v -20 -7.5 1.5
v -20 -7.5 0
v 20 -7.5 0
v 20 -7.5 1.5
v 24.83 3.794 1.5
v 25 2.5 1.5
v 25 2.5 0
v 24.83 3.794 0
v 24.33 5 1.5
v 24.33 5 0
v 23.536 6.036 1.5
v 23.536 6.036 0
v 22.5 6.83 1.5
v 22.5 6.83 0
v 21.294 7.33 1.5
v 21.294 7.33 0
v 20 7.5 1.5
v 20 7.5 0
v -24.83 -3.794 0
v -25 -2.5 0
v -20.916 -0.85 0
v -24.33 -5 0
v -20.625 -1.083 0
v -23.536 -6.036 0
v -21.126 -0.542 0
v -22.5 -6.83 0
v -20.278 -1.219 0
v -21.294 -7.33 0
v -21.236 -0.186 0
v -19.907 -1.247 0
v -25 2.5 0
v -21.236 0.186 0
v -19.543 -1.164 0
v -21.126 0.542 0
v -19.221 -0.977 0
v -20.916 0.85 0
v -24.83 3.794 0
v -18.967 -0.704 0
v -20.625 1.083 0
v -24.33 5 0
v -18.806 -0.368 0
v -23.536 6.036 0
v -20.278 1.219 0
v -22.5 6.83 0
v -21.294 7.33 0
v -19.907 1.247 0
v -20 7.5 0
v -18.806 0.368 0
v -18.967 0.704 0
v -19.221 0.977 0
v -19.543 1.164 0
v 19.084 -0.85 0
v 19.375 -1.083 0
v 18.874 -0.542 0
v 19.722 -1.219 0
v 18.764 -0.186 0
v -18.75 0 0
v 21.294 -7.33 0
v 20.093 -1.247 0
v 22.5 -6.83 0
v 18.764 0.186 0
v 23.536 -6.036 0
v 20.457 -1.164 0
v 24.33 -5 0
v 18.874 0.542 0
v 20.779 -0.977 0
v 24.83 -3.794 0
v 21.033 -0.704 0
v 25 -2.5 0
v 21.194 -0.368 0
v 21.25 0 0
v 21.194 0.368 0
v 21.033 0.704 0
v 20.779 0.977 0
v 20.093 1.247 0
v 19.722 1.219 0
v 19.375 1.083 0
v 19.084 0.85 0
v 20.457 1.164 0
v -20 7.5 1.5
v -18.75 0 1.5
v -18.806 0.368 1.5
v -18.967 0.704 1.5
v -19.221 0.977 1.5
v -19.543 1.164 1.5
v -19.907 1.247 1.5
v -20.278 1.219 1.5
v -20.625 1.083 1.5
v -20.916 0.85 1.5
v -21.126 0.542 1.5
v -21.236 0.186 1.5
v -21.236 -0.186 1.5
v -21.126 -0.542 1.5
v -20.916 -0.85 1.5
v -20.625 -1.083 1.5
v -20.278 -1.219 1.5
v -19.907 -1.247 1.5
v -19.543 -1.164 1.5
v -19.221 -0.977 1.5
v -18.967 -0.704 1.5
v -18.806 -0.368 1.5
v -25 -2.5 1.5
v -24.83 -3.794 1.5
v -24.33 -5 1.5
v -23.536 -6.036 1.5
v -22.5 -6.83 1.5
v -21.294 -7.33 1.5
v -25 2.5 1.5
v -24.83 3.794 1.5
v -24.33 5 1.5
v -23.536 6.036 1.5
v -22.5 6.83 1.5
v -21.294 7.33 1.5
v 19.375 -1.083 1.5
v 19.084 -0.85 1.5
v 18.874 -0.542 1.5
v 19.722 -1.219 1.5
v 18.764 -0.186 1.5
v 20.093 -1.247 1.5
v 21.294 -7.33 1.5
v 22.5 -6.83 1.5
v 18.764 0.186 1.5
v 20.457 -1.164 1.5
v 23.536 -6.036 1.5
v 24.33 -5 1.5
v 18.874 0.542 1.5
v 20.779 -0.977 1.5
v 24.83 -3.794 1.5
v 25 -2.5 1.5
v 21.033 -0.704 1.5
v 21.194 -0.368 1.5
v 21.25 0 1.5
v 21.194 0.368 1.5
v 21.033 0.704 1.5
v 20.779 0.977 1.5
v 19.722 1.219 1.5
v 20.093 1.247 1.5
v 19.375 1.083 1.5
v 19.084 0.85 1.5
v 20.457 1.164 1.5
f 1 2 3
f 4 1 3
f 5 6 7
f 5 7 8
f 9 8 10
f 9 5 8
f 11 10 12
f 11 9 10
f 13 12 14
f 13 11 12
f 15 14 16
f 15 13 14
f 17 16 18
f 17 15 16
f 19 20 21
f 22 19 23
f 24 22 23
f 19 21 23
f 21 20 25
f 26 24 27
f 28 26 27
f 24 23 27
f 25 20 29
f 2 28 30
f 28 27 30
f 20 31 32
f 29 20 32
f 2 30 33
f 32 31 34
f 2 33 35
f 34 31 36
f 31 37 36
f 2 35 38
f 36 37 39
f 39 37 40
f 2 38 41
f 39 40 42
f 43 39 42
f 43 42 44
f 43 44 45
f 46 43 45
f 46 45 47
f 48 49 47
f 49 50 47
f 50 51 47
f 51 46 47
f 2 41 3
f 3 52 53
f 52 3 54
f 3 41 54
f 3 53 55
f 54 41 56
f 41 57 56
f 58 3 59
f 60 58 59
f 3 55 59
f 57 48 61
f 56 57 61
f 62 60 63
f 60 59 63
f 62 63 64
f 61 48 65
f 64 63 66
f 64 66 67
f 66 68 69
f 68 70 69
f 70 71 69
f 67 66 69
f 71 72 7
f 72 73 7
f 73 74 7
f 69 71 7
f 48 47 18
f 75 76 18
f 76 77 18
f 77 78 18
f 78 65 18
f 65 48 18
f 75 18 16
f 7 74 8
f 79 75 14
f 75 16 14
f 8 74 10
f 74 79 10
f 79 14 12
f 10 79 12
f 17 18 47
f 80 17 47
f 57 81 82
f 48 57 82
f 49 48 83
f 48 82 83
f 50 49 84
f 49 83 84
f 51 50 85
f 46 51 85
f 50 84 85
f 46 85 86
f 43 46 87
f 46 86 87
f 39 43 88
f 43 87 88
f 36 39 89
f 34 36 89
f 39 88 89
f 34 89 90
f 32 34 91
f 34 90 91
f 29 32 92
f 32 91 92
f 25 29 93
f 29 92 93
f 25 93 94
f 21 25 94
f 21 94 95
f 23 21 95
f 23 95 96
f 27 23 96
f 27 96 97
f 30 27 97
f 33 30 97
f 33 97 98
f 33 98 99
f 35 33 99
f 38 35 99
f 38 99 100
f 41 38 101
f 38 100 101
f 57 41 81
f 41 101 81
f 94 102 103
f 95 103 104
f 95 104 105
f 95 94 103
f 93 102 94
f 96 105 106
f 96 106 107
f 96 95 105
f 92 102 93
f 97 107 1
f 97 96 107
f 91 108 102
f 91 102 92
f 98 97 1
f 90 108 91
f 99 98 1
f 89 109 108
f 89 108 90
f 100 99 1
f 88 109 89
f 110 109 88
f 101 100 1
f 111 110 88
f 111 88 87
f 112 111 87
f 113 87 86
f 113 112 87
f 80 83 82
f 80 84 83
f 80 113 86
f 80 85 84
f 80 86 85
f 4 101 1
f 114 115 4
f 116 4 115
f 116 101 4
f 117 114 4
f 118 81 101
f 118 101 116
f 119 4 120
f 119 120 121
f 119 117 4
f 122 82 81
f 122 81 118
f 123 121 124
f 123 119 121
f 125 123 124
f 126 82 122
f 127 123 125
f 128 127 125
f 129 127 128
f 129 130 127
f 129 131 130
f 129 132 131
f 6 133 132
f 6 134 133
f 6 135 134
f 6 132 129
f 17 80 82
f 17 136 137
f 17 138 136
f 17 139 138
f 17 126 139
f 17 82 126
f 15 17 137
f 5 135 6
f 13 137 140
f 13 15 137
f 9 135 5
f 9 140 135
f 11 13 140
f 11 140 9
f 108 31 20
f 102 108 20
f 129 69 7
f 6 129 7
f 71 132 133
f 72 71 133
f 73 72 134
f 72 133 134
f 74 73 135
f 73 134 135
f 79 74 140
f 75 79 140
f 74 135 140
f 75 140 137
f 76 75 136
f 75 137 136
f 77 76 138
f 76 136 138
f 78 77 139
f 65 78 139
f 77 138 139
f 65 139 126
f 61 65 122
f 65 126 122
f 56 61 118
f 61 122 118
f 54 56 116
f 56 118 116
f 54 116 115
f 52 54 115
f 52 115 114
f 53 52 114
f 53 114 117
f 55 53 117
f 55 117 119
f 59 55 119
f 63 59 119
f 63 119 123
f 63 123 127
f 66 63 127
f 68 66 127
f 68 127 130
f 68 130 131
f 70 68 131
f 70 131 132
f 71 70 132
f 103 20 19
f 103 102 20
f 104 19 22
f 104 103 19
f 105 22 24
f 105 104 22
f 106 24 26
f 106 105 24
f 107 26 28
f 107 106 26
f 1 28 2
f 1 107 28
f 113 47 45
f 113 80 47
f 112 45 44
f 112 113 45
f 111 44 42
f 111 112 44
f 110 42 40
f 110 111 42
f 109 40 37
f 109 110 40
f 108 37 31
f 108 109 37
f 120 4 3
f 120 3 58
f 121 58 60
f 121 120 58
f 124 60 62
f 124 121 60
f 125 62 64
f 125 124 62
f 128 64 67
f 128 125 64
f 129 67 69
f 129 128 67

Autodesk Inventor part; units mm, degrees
ref_plane "YZ Plane" through (0, 0, 0) normal (1, 0, 0) x (0, 1, 0)
ref_plane "XZ Plane" through (0, 0, 0) normal (0, 1, 0) x (-1, 0, 0)
ref_plane "XY Plane" through (0, 0, 0) normal (0, 0, 1) x (1, 0, 0)
sketch "Sketch1" plane through (0, 0, 0) normal (0, 0, 1) x (1, 0, 0)
  line L0 (-25, -7.5) -> (25, -7.5)
  line L1 (25, -7.5) -> (25, 7.5)
  line L2 (25, 7.5) -> (-25, 7.5)
  line L3 (-25, 7.5) -> (-25, -7.5)
  line L4 (-25, -7.5) -> (25, 7.5) construction
  line L5 (25, -7.5) -> (-25, 7.5) construction
  point P0 (0, 0)
  dimension "d0" = 50
  dimension "d1" = 15
extrude "Extrusion1" add sketch "Sketch1" along normal blind 1.5
sketch "Sketch2" plane through (0, 0, 1.5) normal (0, 0, 1) x (1, 0, 0)
  circle A0 centre (-20, 0) radius 1.25
  line L0 (0, -11.9497) -> (0, 11.9497) projected
  circle A1 centre (20, 0) radius 1.25
  line L1 (-25, 7.5) -> (-25, -7.5) projected
  point P0 (0, 0)
  dimension "d4" = 2.5
  dimension "d5" = 5
extrude "Extrusion2" cut sketch "Sketch2" against normal up to next
fillet "Fillet1" radius 5 4 edges at (25, 7.5, 0.75) (25, -7.5, 0.75) (-25, -7.5, 0.75) (-25, 7.5, 0.75)
sketch "Sketch3" plane through (0, 0, 1.5) normal (0, 0, 1) x (1, 0, 0)
  line L0 (-10.4543, 4.2971) -> (11.6893, 4.2971) construction
  line L1 (11.6893, 4.2971) -> (11.6893, -4.6339) construction
  line L2 (11.6893, -4.6339) -> (-10.4543, -4.6339) construction
  line L3 (-10.4543, -4.6339) -> (-10.4543, 4.2971) construction
sketch "Sketch4" plane through (0, 0, 0) normal (0, 0, -1) x (-1, 0, 0)
  line L0 (-10.4543, 4.2971) -> (11.6893, 4.2971) construction
  line L1 (11.6893, 4.2971) -> (11.6893, -4.6339) construction
  line L2 (11.6893, -4.6339) -> (-10.4543, -4.6339) construction
  line L3 (-10.4543, -4.6339) -> (-10.4543, 4.2971) construction
sketch "Sketch5" plane through (0, 0, 0) normal (0, 0, -1) x (-1, 0, 0)
  circle A0 centre (20, 0) radius 1.25 projected
  circle A1 centre (-20, 0) radius 1.25 projected
  arc A2 (25, 2.5) -> (20, 7.5) centre (20, 2.5) ccw projected
  line L0 (-20, 7.5) -> (20, 7.5) projected
  arc A3 (-20, 7.5) -> (-25, 2.5) centre (-20, 2.5) ccw projected
  line L1 (-25, -2.5) -> (-25, 2.5) projected
  arc A4 (-25, -2.5) -> (-20, -7.5) centre (-20, -2.5) ccw projected
  line L2 (20, -7.5) -> (-20, -7.5) projected
  arc A5 (20, -7.5) -> (25, -2.5) centre (20, -2.5) ccw projected
  line L3 (25, 2.5) -> (25, -2.5) projected
  point P0 (0, 0)
equation "\"d0\" = l_label"
equation "\"d1\" = w_label"
equation "\"d4\" = r_labelscrew"
equation "\"d5\" = ro_labelscrew"
equation "\"d8\" = ro_labelscrew"
equation "\"wl_panel\" = 285"
equation "\"t_panel\" = 8"
equation "\"r_button\" = 8"
equation "\"l_stereo\" = 178"
equation "\"d_stereo\" = 177"
equation "\"w_label\" = 15"
equation "\"l_label\" = 50"
equation "\"r_labelscrew\" = 2.5"
equation "\"ro_labelscrew\" = 5"
equation "\"l_buttontobutton\" = 25"
equation "\"r_usboutlet\" = 29"
equation "\"l_fastener_button\" = 19"
properties part number "label" material "Stainless Steel"
